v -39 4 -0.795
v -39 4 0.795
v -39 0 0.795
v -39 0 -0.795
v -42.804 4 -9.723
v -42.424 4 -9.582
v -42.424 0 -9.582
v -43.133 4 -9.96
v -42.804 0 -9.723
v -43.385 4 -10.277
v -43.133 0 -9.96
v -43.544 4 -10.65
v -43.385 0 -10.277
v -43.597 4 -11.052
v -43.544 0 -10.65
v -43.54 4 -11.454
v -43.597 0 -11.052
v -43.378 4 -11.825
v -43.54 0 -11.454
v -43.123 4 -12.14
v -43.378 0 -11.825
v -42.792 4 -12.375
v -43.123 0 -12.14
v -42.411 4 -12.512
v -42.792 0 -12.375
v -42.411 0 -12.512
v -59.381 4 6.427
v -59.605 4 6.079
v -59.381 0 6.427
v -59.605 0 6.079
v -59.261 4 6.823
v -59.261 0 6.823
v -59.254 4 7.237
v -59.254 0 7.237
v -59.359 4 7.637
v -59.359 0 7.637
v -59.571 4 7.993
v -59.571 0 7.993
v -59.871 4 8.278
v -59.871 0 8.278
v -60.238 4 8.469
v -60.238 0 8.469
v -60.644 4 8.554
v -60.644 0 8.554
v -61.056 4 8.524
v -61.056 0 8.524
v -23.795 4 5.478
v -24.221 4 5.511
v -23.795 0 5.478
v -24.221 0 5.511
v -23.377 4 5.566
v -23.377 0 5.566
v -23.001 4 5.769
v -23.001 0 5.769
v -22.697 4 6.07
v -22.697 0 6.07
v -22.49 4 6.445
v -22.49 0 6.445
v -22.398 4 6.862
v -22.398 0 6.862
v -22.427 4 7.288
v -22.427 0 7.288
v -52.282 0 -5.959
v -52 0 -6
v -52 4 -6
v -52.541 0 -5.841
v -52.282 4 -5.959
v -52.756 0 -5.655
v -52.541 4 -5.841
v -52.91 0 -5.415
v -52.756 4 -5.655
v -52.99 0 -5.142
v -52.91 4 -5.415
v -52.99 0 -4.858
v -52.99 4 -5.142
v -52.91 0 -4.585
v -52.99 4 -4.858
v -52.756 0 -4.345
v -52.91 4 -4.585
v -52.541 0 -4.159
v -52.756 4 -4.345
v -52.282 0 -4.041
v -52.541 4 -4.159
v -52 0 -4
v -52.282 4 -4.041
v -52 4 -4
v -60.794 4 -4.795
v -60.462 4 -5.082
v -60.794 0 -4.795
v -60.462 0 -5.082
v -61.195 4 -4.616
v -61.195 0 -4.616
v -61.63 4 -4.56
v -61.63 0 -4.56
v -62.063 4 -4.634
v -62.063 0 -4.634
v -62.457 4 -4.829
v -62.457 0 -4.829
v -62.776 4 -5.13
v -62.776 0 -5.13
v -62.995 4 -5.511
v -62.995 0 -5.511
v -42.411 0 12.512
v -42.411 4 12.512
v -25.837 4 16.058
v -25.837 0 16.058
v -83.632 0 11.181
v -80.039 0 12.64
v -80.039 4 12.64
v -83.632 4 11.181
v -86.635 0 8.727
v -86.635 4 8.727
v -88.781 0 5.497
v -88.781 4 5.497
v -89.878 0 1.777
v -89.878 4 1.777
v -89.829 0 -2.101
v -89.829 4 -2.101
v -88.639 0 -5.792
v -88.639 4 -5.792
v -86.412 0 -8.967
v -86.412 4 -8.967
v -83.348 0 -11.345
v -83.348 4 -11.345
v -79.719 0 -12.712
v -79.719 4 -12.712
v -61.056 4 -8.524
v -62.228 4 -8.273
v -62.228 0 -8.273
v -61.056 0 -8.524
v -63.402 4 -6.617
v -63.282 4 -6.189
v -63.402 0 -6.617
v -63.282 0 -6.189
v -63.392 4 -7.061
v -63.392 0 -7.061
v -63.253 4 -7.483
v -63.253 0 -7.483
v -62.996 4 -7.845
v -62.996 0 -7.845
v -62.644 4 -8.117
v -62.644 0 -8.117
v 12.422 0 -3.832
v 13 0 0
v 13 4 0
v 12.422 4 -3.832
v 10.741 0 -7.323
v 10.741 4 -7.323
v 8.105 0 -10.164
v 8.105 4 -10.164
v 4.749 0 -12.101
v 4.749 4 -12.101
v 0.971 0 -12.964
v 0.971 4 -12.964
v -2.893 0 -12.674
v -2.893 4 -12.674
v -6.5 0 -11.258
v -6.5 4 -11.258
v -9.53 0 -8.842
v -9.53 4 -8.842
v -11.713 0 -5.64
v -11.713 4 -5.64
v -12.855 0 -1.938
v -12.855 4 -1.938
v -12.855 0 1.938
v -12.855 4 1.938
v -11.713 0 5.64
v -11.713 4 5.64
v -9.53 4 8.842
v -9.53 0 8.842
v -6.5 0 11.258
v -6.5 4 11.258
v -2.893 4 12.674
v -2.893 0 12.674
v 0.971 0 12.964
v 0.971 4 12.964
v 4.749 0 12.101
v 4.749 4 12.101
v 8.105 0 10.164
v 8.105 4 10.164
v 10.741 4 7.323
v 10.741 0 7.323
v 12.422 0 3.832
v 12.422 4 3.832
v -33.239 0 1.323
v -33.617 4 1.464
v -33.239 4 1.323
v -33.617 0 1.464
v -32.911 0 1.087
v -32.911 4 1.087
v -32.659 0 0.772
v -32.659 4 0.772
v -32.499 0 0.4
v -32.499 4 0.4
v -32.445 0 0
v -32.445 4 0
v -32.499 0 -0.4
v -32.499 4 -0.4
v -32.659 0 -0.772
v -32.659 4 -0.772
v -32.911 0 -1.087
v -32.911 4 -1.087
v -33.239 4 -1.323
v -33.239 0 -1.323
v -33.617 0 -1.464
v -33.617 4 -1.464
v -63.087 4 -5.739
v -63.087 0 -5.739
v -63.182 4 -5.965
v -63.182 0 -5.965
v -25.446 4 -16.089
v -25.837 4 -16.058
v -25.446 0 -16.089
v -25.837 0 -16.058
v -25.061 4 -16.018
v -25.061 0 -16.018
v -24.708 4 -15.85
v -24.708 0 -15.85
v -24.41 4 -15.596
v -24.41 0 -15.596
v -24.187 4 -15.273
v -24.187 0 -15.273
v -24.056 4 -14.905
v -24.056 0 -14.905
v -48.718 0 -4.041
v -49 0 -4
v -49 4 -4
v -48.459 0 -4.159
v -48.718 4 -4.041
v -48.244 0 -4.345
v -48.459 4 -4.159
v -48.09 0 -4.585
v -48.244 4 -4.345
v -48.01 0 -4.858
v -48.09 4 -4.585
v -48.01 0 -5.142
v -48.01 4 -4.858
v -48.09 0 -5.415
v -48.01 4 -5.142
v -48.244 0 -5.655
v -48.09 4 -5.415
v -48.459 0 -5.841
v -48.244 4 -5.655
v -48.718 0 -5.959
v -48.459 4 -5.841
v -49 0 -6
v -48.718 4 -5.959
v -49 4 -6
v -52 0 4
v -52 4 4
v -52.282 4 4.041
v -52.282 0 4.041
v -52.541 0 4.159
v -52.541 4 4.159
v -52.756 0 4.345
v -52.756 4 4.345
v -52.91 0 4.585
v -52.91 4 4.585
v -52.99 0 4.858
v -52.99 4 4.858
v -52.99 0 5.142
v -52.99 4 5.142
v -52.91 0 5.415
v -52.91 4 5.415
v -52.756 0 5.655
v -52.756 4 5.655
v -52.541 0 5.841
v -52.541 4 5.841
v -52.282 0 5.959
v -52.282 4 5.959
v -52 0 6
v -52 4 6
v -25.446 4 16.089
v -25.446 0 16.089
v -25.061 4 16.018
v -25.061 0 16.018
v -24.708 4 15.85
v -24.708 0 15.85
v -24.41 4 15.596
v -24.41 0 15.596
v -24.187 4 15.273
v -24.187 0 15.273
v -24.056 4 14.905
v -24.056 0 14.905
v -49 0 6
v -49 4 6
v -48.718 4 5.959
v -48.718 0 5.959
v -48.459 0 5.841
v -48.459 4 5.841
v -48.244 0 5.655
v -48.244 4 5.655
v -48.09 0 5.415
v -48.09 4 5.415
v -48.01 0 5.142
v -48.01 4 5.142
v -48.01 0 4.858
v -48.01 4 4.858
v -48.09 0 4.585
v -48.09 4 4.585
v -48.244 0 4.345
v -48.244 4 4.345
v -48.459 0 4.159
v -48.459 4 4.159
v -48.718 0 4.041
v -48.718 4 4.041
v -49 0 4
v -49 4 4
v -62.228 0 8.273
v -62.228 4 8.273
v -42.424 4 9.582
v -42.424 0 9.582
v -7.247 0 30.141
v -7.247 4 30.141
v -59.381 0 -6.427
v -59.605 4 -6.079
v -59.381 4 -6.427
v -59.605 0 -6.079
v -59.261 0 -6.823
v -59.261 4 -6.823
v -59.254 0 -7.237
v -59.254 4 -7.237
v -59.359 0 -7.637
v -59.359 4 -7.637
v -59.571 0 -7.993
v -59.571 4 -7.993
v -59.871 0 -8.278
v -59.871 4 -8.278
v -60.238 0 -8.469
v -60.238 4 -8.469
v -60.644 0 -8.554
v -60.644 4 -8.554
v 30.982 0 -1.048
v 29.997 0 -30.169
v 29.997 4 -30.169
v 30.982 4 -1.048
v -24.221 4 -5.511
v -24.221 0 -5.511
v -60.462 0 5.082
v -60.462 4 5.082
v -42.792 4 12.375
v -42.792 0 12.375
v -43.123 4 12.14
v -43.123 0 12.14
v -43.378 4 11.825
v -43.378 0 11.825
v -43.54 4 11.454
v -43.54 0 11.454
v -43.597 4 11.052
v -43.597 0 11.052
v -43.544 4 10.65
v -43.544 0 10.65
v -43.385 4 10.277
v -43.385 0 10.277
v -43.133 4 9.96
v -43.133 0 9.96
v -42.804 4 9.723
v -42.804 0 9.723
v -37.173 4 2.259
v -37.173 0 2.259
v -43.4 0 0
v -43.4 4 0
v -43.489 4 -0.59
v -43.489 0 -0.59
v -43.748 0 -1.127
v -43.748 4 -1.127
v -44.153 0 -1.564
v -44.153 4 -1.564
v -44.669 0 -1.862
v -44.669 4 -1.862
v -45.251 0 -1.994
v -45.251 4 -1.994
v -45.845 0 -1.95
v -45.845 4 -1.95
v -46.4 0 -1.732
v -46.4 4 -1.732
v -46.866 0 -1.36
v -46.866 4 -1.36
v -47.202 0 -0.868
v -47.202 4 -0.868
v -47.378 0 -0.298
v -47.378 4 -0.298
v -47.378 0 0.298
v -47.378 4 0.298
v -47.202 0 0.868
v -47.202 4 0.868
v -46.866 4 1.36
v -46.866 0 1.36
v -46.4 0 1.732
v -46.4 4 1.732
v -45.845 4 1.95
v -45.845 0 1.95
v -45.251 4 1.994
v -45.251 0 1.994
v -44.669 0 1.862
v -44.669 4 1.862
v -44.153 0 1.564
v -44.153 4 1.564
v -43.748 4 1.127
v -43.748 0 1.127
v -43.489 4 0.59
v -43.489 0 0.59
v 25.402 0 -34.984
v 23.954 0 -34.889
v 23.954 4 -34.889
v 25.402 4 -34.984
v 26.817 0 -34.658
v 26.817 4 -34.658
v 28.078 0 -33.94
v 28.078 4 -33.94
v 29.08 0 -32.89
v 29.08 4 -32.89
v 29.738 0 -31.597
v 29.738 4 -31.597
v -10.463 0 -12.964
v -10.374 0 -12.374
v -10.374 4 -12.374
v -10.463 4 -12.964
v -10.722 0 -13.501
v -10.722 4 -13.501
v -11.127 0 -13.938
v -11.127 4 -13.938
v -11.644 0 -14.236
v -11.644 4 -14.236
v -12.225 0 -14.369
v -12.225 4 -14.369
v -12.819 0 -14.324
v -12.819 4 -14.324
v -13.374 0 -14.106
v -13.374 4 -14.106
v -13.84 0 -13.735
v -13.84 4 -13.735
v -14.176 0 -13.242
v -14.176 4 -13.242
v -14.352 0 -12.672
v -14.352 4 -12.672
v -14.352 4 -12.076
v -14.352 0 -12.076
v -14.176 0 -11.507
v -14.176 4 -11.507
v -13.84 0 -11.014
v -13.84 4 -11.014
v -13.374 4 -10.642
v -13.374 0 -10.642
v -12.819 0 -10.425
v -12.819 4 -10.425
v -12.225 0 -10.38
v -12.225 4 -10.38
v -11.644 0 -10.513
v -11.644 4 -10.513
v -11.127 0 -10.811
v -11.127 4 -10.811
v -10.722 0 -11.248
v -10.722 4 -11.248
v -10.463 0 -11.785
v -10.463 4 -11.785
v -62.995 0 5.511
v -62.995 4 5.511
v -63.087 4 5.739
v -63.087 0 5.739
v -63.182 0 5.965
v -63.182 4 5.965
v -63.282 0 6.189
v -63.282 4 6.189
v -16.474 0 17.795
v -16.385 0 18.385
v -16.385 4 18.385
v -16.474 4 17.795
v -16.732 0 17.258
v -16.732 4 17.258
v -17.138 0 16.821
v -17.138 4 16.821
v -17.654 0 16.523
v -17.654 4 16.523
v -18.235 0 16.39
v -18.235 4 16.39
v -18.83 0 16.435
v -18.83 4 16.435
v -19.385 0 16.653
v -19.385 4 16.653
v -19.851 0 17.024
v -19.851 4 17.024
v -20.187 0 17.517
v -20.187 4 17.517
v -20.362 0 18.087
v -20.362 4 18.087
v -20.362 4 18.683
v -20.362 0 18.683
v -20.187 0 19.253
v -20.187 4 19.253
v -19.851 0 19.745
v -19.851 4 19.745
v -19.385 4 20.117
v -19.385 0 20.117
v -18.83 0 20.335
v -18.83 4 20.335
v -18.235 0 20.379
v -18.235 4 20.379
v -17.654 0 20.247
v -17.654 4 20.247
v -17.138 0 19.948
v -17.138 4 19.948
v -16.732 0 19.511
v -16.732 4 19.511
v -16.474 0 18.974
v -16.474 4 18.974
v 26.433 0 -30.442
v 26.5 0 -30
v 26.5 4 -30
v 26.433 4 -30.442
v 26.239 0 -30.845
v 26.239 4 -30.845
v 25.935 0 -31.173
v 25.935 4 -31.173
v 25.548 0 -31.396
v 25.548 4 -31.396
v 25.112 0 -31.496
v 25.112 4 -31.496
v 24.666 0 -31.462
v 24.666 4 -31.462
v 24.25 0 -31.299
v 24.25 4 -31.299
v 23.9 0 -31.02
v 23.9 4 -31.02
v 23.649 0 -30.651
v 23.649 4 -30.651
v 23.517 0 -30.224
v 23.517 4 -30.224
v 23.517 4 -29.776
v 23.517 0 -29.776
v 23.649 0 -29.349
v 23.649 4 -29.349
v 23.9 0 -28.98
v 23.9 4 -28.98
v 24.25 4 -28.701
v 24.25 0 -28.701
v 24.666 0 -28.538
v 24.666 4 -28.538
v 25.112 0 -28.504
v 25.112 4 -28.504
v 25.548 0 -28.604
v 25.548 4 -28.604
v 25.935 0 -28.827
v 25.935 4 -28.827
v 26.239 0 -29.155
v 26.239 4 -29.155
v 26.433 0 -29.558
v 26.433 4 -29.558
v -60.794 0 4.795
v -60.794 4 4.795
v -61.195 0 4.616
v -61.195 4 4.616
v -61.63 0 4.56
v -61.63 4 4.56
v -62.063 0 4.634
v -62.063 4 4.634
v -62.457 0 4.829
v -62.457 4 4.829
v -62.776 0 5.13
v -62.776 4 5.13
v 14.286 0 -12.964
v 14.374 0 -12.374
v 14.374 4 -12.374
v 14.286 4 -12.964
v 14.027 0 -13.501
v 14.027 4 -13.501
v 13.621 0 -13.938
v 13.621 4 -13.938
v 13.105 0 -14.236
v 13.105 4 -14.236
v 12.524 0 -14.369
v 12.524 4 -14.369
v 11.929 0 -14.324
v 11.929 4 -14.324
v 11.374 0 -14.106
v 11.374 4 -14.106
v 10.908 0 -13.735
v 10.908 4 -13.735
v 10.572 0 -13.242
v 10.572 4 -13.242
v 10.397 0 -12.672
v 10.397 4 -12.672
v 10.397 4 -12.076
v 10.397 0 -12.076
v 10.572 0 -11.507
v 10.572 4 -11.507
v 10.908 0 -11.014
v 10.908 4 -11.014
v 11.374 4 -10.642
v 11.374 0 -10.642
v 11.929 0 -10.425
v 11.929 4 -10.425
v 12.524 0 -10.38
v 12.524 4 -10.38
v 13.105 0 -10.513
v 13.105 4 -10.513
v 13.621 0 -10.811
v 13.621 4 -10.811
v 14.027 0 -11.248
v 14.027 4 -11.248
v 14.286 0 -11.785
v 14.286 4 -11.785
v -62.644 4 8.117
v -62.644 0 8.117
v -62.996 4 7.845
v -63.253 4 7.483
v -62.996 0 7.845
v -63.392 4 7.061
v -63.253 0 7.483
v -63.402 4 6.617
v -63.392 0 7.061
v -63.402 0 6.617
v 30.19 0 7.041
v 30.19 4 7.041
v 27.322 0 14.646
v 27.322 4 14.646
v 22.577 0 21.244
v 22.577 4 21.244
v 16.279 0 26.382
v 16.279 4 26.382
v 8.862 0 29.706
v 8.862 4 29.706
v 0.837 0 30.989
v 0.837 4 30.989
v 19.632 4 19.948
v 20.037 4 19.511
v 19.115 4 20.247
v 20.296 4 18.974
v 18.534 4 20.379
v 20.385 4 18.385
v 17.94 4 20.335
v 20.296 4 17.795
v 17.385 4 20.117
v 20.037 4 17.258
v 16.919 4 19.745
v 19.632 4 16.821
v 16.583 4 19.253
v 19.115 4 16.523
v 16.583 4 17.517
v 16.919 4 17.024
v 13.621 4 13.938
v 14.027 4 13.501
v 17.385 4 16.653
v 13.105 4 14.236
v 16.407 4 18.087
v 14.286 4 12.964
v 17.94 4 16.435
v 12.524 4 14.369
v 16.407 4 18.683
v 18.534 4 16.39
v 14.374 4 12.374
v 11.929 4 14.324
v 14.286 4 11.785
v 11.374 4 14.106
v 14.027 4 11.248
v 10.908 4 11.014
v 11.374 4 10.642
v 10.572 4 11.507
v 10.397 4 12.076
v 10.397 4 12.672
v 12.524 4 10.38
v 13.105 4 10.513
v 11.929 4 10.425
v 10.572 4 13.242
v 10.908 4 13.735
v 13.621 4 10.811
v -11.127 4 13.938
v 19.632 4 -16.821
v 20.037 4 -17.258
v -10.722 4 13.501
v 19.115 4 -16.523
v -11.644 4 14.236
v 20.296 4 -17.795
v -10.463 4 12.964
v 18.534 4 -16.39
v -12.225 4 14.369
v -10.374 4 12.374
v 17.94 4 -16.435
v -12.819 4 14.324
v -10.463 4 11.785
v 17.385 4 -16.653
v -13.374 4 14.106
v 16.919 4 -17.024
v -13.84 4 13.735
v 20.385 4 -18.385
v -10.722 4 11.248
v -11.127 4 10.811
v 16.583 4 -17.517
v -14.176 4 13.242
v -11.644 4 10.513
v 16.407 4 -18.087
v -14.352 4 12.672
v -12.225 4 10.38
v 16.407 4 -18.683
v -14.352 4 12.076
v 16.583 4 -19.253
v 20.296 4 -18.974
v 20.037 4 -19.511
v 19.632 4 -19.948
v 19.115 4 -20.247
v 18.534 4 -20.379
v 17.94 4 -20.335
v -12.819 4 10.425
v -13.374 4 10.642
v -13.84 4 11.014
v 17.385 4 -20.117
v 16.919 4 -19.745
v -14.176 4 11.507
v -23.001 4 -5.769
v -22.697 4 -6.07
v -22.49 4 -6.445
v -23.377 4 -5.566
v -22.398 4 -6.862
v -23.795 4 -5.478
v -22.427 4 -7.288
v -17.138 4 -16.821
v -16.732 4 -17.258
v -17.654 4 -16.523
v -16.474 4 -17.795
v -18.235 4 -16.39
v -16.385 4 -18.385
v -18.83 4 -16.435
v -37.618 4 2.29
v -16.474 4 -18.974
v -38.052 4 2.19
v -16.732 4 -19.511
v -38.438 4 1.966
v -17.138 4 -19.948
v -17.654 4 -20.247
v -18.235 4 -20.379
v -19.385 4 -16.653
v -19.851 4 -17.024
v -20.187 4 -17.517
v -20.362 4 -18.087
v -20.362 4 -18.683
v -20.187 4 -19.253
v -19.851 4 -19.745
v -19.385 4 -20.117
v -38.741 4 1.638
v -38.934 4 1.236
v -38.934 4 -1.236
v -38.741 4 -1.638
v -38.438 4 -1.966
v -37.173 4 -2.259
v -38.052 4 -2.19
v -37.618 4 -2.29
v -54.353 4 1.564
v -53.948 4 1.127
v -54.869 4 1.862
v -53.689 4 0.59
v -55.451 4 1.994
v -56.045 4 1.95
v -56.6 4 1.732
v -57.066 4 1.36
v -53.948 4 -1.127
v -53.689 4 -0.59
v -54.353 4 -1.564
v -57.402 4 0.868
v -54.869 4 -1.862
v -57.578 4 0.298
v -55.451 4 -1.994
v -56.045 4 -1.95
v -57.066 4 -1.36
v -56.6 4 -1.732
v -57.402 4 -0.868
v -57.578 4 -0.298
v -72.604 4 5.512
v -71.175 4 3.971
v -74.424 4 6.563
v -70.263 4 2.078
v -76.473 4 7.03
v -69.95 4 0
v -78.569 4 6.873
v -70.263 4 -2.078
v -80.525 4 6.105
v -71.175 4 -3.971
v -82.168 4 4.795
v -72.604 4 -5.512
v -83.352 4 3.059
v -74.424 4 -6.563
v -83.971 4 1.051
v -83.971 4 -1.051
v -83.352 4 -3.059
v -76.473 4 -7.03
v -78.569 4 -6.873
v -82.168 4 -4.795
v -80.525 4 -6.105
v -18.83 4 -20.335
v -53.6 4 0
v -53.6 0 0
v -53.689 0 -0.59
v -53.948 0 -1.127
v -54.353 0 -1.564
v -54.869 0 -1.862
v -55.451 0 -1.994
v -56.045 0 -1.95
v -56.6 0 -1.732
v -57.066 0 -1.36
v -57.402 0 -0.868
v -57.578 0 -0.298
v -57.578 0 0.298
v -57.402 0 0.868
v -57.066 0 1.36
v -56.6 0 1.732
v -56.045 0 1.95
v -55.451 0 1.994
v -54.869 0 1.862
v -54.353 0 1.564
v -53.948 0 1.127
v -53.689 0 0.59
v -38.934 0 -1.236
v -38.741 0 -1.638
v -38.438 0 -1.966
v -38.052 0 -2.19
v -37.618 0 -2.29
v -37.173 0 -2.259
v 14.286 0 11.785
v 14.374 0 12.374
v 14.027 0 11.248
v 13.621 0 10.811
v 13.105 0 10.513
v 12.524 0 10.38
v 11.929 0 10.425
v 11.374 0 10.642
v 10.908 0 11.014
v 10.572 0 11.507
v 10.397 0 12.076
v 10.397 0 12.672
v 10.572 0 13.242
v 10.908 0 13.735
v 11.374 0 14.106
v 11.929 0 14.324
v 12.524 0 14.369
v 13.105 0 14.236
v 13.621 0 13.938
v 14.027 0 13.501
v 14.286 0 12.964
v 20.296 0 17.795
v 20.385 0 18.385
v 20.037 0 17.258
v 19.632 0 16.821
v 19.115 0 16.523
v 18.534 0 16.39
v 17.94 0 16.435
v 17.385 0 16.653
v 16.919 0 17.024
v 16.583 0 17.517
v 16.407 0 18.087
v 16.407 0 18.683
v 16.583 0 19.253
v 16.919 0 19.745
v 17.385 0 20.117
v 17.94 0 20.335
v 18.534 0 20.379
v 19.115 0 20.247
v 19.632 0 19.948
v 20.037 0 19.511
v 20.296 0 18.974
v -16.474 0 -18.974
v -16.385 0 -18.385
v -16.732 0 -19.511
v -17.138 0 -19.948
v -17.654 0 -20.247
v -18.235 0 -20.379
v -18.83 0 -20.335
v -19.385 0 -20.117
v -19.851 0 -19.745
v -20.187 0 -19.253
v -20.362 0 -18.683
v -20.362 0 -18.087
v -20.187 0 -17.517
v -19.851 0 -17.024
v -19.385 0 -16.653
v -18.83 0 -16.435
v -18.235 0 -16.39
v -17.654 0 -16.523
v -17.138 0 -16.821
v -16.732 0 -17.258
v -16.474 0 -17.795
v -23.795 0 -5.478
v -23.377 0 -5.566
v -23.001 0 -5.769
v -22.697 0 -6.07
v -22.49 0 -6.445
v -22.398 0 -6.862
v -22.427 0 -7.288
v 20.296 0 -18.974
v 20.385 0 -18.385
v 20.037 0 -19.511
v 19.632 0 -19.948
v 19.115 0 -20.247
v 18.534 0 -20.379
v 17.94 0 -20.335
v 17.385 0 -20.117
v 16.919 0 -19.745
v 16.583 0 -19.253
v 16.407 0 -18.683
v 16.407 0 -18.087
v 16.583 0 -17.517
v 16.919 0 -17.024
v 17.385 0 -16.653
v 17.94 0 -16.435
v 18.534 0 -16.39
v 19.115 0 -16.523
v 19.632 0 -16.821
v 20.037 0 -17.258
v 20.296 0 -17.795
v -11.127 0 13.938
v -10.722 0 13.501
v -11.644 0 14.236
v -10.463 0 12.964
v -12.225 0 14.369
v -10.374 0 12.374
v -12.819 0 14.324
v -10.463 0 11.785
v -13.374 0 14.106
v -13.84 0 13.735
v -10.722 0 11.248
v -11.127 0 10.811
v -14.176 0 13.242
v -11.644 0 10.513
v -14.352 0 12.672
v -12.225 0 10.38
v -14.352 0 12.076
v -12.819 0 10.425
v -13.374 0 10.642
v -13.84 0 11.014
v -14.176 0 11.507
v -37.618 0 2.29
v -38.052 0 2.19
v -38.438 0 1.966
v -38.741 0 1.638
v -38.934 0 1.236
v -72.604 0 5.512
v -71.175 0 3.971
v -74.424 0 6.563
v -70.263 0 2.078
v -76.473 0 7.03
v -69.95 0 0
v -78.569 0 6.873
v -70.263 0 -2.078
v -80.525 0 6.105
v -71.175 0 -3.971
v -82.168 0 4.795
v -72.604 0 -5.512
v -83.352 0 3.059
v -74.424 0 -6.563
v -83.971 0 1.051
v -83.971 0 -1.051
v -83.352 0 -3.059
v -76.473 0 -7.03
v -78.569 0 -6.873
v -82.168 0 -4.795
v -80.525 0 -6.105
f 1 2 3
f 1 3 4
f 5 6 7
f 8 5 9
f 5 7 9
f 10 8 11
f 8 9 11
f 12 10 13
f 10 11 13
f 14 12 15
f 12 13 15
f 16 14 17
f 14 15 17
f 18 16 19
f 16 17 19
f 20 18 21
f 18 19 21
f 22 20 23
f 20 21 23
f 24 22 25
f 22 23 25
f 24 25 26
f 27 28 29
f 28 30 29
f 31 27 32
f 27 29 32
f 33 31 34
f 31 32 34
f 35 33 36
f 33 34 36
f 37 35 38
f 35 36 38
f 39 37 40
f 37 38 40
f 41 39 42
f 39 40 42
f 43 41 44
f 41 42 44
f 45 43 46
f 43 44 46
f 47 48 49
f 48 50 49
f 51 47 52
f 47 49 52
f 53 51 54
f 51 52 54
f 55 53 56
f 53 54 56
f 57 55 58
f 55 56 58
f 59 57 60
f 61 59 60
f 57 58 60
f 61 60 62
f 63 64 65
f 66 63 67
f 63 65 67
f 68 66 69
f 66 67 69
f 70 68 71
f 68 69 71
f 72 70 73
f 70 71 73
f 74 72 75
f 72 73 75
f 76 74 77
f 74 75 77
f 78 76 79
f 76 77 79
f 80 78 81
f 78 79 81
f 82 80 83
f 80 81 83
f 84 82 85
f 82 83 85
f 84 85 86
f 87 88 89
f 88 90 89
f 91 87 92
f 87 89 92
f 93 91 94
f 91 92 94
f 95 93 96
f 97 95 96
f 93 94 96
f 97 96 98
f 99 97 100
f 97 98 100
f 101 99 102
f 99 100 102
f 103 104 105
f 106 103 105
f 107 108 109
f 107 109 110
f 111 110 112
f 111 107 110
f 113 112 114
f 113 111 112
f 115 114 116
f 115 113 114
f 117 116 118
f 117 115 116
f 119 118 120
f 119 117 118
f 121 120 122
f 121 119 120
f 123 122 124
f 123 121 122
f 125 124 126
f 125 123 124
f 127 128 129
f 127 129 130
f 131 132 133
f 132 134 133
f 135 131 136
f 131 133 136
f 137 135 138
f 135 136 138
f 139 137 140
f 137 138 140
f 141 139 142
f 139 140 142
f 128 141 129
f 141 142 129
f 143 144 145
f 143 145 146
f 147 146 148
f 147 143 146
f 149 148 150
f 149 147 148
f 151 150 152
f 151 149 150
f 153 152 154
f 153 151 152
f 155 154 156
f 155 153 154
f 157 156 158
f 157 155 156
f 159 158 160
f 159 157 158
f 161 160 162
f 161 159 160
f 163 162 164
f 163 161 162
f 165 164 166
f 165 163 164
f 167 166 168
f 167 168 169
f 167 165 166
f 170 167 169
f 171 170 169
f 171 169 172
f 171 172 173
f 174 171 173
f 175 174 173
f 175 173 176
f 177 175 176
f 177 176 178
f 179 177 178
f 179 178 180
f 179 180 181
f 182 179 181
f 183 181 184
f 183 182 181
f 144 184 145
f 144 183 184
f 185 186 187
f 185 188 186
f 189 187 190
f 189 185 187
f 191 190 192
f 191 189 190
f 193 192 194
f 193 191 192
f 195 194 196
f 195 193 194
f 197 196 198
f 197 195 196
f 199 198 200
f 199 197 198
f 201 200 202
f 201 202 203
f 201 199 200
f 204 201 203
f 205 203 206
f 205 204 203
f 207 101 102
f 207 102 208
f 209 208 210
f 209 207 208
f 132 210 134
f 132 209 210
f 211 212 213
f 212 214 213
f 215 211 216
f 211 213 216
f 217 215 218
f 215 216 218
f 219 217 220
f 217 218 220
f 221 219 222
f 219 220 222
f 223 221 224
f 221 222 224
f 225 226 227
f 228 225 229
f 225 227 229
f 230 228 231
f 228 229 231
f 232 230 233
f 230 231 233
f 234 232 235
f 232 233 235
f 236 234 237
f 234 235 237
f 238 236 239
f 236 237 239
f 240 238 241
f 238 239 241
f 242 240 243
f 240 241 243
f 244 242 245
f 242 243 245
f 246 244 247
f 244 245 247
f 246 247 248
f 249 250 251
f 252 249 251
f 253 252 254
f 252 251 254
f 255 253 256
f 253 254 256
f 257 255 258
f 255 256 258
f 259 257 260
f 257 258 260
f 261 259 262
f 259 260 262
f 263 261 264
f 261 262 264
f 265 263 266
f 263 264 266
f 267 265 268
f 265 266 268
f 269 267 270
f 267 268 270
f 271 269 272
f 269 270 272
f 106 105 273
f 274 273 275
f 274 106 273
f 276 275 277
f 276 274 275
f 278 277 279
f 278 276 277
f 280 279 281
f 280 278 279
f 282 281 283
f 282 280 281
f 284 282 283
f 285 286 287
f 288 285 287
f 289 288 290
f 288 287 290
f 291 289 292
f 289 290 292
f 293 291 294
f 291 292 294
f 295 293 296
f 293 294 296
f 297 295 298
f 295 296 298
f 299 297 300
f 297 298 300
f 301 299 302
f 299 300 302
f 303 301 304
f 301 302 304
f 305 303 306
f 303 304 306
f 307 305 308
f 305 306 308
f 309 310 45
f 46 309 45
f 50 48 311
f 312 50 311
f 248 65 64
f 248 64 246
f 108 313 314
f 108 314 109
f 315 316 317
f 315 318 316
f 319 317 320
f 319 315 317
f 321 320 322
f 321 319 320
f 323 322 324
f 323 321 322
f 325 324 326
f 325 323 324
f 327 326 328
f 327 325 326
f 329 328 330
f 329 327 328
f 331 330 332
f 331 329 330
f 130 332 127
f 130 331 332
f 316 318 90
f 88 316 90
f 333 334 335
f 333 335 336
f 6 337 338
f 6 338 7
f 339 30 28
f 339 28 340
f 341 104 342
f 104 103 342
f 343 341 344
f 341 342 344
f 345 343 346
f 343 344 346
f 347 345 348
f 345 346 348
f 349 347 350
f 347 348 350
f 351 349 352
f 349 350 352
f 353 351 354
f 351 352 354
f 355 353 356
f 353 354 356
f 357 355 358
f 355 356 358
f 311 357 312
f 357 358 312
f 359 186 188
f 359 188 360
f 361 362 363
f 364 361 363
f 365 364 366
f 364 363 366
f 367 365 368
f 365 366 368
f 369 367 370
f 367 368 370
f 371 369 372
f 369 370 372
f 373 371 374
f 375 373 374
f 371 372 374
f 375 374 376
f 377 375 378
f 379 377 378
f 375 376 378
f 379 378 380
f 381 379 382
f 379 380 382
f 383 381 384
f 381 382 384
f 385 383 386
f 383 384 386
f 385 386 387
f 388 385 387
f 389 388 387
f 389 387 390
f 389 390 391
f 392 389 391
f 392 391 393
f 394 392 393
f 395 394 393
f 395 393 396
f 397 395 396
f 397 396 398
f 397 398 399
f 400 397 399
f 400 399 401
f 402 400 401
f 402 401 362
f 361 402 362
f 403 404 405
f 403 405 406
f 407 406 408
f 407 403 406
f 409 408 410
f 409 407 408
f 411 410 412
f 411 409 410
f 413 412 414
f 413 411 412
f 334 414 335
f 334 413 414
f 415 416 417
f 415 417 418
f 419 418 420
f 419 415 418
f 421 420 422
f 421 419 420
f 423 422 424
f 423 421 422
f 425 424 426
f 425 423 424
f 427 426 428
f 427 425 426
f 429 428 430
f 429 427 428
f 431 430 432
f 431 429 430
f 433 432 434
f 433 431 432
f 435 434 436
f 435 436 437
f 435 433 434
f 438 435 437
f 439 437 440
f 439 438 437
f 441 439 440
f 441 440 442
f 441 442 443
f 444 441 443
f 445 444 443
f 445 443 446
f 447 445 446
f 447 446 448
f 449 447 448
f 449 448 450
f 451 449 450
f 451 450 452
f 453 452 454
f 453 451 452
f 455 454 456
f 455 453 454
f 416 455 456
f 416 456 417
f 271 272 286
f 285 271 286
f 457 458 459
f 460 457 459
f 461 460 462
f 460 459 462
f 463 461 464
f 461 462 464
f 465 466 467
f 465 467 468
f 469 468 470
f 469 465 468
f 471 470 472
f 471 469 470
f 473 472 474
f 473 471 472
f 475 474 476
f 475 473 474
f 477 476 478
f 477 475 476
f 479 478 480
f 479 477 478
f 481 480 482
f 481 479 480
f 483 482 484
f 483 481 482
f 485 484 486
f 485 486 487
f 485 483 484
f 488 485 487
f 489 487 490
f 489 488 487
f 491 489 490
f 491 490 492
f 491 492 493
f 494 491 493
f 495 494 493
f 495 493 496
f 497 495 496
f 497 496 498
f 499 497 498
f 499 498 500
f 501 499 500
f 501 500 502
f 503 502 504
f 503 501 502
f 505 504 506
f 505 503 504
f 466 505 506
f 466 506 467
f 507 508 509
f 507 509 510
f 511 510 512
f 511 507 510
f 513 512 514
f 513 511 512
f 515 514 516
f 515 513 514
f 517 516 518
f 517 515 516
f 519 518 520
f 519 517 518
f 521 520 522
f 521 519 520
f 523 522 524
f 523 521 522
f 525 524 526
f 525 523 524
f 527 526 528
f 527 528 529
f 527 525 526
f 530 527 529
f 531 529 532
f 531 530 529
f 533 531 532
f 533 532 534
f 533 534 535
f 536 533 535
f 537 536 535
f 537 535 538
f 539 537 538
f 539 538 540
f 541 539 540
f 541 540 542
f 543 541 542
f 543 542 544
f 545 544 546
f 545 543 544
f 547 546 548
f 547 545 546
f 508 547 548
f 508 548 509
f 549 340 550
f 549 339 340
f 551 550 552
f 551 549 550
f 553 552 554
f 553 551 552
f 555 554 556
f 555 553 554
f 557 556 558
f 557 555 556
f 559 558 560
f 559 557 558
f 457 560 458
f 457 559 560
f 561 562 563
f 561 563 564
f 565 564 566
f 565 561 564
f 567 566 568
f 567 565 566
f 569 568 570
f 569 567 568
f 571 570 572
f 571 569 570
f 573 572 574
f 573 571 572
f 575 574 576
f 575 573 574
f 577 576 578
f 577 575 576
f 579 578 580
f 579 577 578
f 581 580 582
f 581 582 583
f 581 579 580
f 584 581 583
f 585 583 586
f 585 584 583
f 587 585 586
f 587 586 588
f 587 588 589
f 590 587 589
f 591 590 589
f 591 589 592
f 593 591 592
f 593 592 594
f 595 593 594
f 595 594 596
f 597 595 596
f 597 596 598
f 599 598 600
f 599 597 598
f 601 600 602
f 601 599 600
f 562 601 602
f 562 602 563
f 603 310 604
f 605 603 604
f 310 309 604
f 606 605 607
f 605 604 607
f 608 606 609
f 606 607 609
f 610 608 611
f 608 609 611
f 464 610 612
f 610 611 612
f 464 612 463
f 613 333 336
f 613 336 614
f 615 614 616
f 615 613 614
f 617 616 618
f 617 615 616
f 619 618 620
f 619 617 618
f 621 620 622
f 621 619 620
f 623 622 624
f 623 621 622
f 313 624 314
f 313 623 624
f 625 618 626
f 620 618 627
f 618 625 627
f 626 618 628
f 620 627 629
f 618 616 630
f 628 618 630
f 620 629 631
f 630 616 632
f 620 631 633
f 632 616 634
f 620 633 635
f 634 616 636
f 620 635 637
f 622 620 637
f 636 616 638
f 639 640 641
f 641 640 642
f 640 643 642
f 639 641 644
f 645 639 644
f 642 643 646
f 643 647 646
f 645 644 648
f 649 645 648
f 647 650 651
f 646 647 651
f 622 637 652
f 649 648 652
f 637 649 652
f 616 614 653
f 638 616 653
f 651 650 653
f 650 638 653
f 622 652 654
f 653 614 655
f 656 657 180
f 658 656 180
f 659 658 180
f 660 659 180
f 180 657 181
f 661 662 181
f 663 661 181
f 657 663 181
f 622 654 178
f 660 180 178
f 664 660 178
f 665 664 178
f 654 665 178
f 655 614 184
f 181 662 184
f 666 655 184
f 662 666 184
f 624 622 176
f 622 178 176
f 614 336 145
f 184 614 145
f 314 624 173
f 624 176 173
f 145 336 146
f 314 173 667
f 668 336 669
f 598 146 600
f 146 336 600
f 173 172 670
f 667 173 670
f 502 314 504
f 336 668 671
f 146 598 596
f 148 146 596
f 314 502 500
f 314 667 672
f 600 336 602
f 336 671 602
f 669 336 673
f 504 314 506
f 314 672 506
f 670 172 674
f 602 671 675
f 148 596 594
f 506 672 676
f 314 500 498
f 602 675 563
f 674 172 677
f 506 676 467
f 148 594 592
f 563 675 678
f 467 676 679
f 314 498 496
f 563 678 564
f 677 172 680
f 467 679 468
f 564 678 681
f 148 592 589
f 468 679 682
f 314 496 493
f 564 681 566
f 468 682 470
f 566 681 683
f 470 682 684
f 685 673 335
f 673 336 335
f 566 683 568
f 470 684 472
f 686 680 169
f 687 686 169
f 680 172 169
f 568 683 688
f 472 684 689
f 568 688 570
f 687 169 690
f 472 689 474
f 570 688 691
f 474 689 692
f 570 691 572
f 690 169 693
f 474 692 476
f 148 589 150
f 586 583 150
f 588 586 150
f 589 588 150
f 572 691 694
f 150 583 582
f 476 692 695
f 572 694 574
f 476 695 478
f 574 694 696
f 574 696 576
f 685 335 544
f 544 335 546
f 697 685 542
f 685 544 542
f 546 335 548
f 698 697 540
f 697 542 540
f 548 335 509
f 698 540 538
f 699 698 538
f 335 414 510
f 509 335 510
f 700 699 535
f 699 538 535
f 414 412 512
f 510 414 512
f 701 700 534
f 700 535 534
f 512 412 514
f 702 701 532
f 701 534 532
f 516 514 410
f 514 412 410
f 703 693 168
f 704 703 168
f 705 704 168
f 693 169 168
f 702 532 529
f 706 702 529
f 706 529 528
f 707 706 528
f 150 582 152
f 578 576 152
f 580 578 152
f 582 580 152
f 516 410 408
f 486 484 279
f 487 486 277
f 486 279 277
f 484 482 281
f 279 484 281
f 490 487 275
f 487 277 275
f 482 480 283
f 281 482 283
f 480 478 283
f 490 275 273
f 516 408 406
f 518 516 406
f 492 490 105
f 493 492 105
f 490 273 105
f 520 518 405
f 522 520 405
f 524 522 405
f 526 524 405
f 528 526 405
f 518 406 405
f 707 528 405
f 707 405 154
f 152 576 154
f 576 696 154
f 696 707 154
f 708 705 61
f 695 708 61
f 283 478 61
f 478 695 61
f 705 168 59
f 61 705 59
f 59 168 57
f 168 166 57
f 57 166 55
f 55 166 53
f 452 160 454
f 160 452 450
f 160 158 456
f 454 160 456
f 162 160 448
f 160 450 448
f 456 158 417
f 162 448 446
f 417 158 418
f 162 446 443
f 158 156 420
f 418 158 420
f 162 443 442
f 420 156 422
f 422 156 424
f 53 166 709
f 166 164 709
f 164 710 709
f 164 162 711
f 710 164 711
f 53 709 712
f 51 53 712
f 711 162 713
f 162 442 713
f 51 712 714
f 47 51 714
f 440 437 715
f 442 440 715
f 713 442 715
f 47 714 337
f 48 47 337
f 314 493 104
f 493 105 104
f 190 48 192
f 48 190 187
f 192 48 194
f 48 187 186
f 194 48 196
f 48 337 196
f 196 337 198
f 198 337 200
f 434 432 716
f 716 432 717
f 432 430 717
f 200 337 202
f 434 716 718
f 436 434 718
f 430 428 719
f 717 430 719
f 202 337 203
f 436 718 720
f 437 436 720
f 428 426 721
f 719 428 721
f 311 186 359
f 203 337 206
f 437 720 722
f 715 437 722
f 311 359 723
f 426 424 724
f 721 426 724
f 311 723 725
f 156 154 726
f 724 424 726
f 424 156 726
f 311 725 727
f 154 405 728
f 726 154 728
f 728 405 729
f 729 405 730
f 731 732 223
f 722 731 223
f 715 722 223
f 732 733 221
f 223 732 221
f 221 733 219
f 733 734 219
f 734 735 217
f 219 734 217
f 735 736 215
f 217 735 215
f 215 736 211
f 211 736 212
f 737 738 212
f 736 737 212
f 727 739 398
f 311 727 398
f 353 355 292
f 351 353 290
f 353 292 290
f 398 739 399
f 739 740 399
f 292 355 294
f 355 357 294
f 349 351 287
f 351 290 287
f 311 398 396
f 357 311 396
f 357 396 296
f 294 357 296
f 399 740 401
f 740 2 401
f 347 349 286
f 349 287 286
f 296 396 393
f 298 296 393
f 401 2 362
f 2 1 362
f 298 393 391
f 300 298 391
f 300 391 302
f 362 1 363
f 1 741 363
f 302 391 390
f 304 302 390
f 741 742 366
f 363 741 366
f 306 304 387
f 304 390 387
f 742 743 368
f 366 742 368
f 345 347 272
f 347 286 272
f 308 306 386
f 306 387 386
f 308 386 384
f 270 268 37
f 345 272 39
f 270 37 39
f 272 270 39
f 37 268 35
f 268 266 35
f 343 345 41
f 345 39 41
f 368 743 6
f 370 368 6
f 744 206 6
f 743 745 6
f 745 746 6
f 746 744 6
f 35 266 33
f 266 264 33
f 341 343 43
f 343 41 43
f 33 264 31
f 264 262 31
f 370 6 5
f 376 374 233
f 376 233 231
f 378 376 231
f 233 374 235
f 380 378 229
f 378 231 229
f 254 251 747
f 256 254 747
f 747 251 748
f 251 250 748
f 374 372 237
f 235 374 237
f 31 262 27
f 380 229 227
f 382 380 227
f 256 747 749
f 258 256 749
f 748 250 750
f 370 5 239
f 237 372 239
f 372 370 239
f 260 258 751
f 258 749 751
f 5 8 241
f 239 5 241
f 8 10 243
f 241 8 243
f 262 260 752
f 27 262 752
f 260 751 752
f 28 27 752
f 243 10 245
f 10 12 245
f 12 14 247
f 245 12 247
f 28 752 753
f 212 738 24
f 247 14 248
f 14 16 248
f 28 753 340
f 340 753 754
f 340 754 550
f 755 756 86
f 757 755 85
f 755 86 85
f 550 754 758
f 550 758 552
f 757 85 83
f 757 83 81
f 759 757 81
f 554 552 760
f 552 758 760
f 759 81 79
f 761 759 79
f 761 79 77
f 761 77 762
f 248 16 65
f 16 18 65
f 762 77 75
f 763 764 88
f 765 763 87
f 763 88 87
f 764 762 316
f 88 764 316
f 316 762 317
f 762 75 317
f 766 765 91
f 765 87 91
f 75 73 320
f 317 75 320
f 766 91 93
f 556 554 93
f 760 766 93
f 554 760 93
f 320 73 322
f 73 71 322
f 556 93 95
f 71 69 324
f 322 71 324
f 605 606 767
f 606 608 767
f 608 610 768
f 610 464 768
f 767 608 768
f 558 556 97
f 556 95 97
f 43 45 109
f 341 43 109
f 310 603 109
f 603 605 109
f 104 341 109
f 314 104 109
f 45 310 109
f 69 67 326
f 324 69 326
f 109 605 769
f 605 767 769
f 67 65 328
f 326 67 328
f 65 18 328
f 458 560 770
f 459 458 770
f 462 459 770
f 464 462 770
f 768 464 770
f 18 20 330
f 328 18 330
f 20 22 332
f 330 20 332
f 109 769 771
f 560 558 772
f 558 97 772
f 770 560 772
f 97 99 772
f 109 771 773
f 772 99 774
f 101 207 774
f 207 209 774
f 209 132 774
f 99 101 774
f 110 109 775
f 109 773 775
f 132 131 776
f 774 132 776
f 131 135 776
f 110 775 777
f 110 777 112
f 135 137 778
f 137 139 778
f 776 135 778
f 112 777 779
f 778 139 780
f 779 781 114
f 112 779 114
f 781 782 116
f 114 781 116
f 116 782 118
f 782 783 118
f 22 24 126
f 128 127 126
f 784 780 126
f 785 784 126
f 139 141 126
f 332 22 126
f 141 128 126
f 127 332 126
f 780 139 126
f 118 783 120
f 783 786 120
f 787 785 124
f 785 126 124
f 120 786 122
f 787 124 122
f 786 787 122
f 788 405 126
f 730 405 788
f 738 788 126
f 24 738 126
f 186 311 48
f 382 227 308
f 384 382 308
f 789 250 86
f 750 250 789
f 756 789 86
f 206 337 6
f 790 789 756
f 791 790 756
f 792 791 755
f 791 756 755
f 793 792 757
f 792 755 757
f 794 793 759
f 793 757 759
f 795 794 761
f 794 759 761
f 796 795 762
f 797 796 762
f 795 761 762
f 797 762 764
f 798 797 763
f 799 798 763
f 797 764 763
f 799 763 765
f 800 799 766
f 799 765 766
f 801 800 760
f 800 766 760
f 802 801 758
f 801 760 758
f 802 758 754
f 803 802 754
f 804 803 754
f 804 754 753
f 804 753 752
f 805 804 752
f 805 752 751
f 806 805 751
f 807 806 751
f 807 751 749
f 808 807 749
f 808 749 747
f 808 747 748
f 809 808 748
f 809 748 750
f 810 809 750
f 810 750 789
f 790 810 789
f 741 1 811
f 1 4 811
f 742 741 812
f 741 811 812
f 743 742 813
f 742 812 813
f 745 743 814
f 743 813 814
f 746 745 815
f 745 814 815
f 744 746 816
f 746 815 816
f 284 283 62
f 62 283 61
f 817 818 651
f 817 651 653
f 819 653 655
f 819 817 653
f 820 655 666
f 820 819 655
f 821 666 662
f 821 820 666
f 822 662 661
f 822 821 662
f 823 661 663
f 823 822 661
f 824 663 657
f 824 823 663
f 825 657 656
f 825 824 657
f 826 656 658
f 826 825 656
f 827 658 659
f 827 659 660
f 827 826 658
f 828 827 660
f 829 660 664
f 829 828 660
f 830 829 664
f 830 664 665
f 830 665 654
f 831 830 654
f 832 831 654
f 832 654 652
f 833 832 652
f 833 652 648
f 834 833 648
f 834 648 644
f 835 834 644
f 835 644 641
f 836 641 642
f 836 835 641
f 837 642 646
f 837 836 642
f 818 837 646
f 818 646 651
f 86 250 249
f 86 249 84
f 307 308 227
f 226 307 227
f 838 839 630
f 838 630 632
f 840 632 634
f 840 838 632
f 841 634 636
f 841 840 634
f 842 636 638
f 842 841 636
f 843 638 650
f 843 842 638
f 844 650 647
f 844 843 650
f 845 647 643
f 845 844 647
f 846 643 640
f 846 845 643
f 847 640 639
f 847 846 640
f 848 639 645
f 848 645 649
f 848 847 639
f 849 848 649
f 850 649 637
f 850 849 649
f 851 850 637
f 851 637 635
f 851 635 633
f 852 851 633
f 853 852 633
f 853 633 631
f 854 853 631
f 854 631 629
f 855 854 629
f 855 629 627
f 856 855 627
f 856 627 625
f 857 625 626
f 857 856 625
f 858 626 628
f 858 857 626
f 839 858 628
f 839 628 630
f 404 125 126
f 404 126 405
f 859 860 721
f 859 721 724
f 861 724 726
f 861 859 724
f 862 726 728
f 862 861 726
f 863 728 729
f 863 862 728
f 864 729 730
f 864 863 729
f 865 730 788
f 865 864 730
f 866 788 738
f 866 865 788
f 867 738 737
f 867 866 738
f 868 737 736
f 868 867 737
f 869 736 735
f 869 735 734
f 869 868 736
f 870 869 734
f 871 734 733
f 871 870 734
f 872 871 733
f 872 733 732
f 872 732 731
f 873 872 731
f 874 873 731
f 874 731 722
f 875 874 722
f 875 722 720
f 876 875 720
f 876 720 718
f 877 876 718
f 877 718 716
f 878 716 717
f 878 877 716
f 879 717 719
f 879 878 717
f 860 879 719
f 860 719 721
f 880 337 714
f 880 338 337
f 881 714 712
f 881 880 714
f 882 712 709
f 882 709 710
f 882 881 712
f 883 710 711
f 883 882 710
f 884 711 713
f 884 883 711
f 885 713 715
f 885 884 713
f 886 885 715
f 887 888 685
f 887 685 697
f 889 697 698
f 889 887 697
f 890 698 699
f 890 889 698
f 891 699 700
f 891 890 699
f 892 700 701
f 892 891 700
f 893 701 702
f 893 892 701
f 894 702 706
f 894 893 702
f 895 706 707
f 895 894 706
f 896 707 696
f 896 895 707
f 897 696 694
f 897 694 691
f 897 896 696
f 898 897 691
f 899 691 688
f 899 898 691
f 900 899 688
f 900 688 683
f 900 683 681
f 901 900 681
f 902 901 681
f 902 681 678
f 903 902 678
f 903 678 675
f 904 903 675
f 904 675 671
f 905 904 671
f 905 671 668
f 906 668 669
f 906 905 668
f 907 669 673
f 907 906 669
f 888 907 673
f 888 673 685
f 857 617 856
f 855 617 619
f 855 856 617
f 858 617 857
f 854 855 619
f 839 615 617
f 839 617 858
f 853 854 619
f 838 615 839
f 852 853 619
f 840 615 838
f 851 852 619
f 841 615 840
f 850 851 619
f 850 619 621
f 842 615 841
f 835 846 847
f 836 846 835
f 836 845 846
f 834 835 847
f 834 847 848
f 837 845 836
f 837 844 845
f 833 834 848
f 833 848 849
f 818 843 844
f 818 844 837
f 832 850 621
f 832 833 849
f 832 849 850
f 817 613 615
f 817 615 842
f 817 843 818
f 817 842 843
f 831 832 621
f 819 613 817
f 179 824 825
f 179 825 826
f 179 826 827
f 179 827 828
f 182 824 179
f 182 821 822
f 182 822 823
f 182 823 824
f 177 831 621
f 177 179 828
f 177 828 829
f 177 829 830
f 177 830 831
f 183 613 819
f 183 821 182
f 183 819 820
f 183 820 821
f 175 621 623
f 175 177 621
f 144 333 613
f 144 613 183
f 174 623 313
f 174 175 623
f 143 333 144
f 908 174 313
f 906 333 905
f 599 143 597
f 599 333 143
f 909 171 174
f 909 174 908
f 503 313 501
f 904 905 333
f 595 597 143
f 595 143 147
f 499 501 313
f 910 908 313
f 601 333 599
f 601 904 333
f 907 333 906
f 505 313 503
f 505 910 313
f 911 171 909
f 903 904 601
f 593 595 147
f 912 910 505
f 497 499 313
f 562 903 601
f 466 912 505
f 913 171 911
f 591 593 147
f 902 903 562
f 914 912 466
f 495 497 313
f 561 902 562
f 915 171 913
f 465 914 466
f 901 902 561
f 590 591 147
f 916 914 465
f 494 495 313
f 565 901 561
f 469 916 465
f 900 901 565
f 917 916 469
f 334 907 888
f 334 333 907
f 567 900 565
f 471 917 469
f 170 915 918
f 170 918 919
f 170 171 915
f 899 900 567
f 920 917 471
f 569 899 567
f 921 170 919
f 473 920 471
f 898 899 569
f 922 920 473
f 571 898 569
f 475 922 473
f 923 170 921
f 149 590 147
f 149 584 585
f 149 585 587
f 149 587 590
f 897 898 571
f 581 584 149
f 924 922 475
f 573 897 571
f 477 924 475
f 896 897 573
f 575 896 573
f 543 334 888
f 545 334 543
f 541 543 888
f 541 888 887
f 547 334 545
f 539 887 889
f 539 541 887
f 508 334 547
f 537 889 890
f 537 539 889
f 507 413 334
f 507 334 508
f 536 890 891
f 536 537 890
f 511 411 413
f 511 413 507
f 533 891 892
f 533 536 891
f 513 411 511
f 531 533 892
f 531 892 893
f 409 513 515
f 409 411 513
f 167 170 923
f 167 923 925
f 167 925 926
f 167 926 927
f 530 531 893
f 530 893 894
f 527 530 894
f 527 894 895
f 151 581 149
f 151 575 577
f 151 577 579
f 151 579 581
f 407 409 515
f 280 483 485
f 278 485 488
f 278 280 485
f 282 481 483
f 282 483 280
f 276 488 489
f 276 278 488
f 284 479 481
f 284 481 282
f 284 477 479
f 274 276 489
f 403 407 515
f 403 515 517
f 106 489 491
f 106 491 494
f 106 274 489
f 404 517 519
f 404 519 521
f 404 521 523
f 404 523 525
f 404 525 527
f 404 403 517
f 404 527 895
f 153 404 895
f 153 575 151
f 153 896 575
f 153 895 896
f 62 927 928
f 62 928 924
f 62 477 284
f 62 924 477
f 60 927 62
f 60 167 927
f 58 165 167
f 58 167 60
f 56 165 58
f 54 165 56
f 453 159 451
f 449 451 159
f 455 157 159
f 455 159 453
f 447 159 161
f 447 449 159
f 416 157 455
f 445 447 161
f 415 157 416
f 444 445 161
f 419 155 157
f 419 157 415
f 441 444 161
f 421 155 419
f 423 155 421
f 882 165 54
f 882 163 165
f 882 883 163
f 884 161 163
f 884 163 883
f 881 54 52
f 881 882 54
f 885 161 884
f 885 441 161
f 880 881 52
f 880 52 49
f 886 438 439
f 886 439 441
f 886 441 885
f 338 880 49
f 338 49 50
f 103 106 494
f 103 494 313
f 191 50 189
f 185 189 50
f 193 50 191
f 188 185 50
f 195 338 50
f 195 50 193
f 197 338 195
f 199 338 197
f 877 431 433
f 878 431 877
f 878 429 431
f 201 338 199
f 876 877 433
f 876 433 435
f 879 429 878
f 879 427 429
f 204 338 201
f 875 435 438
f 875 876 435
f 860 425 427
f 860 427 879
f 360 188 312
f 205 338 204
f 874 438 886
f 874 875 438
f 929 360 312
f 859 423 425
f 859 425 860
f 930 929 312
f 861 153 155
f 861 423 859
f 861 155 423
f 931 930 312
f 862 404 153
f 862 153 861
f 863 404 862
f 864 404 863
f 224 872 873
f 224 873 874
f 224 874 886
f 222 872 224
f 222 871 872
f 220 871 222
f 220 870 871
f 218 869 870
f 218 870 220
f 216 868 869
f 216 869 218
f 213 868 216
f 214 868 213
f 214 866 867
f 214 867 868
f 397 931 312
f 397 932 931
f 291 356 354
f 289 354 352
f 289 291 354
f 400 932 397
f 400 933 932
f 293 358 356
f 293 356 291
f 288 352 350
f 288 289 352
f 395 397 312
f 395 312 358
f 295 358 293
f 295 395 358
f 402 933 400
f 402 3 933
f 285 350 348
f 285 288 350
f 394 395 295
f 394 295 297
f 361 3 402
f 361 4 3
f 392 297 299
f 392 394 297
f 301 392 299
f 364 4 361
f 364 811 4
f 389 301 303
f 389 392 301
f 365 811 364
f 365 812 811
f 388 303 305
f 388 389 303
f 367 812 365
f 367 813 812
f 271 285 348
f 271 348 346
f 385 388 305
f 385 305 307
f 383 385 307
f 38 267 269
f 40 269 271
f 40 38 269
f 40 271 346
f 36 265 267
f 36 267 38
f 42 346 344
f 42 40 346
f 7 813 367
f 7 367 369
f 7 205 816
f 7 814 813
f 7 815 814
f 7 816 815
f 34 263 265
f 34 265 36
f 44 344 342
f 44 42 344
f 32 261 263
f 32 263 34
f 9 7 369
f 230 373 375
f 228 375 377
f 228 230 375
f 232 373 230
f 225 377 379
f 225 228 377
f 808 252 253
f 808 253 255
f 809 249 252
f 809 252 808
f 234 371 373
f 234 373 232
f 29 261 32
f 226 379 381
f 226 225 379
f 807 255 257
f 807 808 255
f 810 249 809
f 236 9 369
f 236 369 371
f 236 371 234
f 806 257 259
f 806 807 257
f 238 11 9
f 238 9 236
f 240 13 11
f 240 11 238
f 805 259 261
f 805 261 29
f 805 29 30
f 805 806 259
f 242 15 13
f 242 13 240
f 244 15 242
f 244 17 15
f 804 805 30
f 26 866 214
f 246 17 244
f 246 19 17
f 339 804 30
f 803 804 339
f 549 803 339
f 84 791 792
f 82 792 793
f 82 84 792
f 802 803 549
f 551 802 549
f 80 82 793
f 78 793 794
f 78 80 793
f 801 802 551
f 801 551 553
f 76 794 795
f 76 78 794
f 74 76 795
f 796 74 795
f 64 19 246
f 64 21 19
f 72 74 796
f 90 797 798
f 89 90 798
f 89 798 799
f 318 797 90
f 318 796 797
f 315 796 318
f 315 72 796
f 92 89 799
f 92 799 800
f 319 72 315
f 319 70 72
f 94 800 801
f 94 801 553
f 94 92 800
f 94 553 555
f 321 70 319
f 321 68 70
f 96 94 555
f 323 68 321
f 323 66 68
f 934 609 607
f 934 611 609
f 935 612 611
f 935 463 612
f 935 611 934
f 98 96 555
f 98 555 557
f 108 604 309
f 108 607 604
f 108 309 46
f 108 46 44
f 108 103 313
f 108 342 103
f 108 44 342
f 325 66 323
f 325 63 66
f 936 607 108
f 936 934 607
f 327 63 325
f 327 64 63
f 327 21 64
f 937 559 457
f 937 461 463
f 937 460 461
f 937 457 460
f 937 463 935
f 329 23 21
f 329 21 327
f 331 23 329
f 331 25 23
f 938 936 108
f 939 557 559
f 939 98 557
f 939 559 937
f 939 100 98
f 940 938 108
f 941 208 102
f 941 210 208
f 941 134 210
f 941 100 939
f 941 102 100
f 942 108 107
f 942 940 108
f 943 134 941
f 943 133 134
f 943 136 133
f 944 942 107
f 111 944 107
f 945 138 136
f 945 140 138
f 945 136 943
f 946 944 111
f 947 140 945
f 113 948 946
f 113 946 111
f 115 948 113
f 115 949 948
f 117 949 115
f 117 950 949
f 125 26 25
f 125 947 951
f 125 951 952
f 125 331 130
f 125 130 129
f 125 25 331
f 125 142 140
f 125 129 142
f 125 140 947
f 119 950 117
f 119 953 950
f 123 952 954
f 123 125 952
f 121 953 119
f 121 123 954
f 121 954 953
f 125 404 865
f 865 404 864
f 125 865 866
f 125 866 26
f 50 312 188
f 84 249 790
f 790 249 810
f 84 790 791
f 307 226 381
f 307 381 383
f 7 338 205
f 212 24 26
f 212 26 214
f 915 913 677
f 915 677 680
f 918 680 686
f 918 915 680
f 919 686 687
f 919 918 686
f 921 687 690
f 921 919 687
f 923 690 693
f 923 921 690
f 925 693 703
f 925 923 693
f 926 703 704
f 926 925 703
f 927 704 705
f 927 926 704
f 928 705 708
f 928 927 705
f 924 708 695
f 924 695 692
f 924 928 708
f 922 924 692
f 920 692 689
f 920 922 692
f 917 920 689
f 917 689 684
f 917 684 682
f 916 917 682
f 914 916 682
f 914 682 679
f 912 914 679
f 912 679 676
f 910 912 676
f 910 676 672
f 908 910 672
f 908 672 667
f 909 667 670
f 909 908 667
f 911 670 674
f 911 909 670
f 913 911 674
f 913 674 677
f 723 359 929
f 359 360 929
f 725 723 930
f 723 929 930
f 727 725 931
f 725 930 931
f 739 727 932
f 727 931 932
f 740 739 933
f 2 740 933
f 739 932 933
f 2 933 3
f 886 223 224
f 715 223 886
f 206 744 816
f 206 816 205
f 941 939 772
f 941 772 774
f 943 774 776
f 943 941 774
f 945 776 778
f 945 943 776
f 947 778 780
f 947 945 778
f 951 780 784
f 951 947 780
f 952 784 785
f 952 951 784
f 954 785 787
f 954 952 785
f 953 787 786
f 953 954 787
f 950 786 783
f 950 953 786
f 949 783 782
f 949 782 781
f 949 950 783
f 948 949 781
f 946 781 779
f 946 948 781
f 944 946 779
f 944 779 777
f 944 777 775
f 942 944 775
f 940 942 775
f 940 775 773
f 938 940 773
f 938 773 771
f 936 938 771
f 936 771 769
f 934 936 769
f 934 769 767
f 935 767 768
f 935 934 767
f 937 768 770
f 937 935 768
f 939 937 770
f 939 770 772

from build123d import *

# Parameters (mm, degrees)
SKETCH_1_R          = 7.05
SKETCH_1_R_2        = 1.5
SKETCH_1_R_3        = 2
SKETCH_1_R_4        = 13
EXTRUDE_1_DEPTH     = 4
SKETCH_4_R          = 2
SKETCH_4_W          = 3
SKETCH_4_H          = 12
CUT_EXTRUDE_7_DEPTH = 5
SKETCH_8_R          = 1
CUT_EXTRUDE_6_DEPTH = 5
CUT_EXTRUDE_8_DEPTH = 5
FILLET_1_R          = 1.5


with BuildPart() as part:
    # 草图1 → 凸台-拉伸1 (new body)
    with BuildSketch(Plane(origin=(0, 0, 0), x_dir=(1, 0, 0), z_dir=(0, 1, 0))):
        with BuildLine():
            Line((-79.719334557, 12.712404162), (23.954102093, 34.889386216))
            ThreePointArc((23.954102093, 34.889386216), (28.077901504, 33.940370837), (29.997141433, 30.169048806))
            Line((29.997141433, 30.169048806), (30.982276884, 1.048102596))
            ThreePointArc((30.982276884, 1.048102596), (19.5968113, -24.02009548), (-7.246753247, -30.141077741))
            Line((-7.246753247, -30.141077741), (-80.038961039, -12.639806795))
            ThreePointArc((-80.038961039, -12.639806795), (-89.998966964, 0.163883698), (-79.719334557, 12.712404162))
        make_face()
        with Locations((-77, 0)):
            Circle(SKETCH_1_R, mode=Mode.SUBTRACT)
        with Locations((25, 30)):
            Circle(SKETCH_1_R_2, mode=Mode.SUBTRACT)
        with Locations((-18.384776311, 18.384776311)):
            Circle(SKETCH_1_R_3, mode=Mode.SUBTRACT)
        with Locations((18.384776311, 18.384776311)):
            Circle(SKETCH_1_R_3, mode=Mode.SUBTRACT)
        with Locations((18.384776311, -18.384776311)):
            Circle(SKETCH_1_R_3, mode=Mode.SUBTRACT)
        with Locations((-18.384776311, -18.384776311)):
            Circle(SKETCH_1_R_3, mode=Mode.SUBTRACT)
        with Locations((-12.374368671, 12.374368671)):
            Circle(SKETCH_1_R_3, mode=Mode.SUBTRACT)
        with Locations((12.374368671, 12.374368671)):
            Circle(SKETCH_1_R_3, mode=Mode.SUBTRACT)
        with Locations((12.374368671, -12.374368671)):
            Circle(SKETCH_1_R_3, mode=Mode.SUBTRACT)
        with Locations((-12.374368671, -12.374368671)):
            Circle(SKETCH_1_R_3, mode=Mode.SUBTRACT)
        Circle(SKETCH_1_R_4, mode=Mode.SUBTRACT)
    extrude(amount=EXTRUDE_1_DEPTH)

    # 草图4 → 切除-拉伸7 (cut, through all)
    with BuildSketch(Plane(origin=(0, 4, 0), x_dir=(1, 0, 0), z_dir=(0, 1, 0))):
        with Locations((-55.6, 0)):
            Circle(SKETCH_4_R)
        with Locations((-45.4, 0)):
            Circle(SKETCH_4_R)
        with Locations((-50.5, 0)):
            Rectangle(SKETCH_4_W, SKETCH_4_H)
    extrude(amount=-CUT_EXTRUDE_7_DEPTH, mode=Mode.SUBTRACT)

    # 草图8 → 切除-拉伸6 (cut, through all)
    with BuildSketch(Plane(origin=(0, 4, 0), x_dir=(1, 0, 0), z_dir=(0, 1, 0))):
        with Locations((-52, 5)):
            Circle(SKETCH_8_R)
        with Locations((-52, -5)):
            Circle(SKETCH_8_R)
        with Locations((-49, -5)):
            Circle(SKETCH_8_R)
        with Locations((-49, 5)):
            Circle(SKETCH_8_R)
    extrude(amount=-CUT_EXTRUDE_6_DEPTH, mode=Mode.SUBTRACT)

    # 草图9 → 切除-拉伸8 (cut, through all)
    with BuildSketch(Plane(origin=(0, 4, 0), x_dir=(1, 0, 0), z_dir=(0, 1, 0))):
        Polygon((-24.369873114, 16.371326789), (-21.937410968, 5), (-49.115560904, 11.077929639), align=None)
        Polygon((-49.115560904, -11.077929639), (-24.369873114, -16.371326789), (-21.937410968, -5), align=None)
        with BuildLine():
            Line((-64.164776302, 7.858723345), (-56.703068356, 9.454871486))
            Line((-56.703068356, 9.454871486), (-62.252034039, 3))
            ThreePointArc((-62.252034039, 3), (-62.996076047, 5.512949656), (-64.164776302, 7.858723345))
        make_face()
        with BuildLine():
            Line((-56.703068356, -9.454871486), (-62.252034039, -3))
            ThreePointArc((-62.252034039, -3), (-62.996076047, -5.512949656), (-64.164776302, -7.858723345))
            Line((-64.164776302, -7.858723345), (-56.703068356, -9.454871486))
        make_face()
        Polygon((-39, 2.667552297), (-27.071738141, 0), (-39, -2.667552297), align=None)
    extrude(amount=-CUT_EXTRUDE_8_DEPTH, mode=Mode.SUBTRACT)

    # 圆角1
    fillet_1_edges = [part.edges().sort_by_distance(p)[0] for p in [
        (-49.115560904, 2, 11.077929639),
        (-21.937410968, 2, 5),
        (-24.369873114, 2, 16.371326789),
        (-62.252034039, 2, -3),
        (-64.164776302, 2, -7.858723345),
        (-56.703068356, 2, -9.454871486),
        (-39, 2, 2.667552297),
        (-39, 2, -2.667552297),
        (-27.071738141, 2, 0),
        (-64.164776302, 2, 7.858723345),
        (-62.252034039, 2, 3),
        (-56.703068356, 2, 9.454871486),
        (-49.115560904, 2, -11.077929639),
        (-24.369873114, 2, -16.371326789),
        (-21.937410968, 2, -5),
    ]]
    fillet(fillet_1_edges, radius=FILLET_1_R)


solid = part.part
